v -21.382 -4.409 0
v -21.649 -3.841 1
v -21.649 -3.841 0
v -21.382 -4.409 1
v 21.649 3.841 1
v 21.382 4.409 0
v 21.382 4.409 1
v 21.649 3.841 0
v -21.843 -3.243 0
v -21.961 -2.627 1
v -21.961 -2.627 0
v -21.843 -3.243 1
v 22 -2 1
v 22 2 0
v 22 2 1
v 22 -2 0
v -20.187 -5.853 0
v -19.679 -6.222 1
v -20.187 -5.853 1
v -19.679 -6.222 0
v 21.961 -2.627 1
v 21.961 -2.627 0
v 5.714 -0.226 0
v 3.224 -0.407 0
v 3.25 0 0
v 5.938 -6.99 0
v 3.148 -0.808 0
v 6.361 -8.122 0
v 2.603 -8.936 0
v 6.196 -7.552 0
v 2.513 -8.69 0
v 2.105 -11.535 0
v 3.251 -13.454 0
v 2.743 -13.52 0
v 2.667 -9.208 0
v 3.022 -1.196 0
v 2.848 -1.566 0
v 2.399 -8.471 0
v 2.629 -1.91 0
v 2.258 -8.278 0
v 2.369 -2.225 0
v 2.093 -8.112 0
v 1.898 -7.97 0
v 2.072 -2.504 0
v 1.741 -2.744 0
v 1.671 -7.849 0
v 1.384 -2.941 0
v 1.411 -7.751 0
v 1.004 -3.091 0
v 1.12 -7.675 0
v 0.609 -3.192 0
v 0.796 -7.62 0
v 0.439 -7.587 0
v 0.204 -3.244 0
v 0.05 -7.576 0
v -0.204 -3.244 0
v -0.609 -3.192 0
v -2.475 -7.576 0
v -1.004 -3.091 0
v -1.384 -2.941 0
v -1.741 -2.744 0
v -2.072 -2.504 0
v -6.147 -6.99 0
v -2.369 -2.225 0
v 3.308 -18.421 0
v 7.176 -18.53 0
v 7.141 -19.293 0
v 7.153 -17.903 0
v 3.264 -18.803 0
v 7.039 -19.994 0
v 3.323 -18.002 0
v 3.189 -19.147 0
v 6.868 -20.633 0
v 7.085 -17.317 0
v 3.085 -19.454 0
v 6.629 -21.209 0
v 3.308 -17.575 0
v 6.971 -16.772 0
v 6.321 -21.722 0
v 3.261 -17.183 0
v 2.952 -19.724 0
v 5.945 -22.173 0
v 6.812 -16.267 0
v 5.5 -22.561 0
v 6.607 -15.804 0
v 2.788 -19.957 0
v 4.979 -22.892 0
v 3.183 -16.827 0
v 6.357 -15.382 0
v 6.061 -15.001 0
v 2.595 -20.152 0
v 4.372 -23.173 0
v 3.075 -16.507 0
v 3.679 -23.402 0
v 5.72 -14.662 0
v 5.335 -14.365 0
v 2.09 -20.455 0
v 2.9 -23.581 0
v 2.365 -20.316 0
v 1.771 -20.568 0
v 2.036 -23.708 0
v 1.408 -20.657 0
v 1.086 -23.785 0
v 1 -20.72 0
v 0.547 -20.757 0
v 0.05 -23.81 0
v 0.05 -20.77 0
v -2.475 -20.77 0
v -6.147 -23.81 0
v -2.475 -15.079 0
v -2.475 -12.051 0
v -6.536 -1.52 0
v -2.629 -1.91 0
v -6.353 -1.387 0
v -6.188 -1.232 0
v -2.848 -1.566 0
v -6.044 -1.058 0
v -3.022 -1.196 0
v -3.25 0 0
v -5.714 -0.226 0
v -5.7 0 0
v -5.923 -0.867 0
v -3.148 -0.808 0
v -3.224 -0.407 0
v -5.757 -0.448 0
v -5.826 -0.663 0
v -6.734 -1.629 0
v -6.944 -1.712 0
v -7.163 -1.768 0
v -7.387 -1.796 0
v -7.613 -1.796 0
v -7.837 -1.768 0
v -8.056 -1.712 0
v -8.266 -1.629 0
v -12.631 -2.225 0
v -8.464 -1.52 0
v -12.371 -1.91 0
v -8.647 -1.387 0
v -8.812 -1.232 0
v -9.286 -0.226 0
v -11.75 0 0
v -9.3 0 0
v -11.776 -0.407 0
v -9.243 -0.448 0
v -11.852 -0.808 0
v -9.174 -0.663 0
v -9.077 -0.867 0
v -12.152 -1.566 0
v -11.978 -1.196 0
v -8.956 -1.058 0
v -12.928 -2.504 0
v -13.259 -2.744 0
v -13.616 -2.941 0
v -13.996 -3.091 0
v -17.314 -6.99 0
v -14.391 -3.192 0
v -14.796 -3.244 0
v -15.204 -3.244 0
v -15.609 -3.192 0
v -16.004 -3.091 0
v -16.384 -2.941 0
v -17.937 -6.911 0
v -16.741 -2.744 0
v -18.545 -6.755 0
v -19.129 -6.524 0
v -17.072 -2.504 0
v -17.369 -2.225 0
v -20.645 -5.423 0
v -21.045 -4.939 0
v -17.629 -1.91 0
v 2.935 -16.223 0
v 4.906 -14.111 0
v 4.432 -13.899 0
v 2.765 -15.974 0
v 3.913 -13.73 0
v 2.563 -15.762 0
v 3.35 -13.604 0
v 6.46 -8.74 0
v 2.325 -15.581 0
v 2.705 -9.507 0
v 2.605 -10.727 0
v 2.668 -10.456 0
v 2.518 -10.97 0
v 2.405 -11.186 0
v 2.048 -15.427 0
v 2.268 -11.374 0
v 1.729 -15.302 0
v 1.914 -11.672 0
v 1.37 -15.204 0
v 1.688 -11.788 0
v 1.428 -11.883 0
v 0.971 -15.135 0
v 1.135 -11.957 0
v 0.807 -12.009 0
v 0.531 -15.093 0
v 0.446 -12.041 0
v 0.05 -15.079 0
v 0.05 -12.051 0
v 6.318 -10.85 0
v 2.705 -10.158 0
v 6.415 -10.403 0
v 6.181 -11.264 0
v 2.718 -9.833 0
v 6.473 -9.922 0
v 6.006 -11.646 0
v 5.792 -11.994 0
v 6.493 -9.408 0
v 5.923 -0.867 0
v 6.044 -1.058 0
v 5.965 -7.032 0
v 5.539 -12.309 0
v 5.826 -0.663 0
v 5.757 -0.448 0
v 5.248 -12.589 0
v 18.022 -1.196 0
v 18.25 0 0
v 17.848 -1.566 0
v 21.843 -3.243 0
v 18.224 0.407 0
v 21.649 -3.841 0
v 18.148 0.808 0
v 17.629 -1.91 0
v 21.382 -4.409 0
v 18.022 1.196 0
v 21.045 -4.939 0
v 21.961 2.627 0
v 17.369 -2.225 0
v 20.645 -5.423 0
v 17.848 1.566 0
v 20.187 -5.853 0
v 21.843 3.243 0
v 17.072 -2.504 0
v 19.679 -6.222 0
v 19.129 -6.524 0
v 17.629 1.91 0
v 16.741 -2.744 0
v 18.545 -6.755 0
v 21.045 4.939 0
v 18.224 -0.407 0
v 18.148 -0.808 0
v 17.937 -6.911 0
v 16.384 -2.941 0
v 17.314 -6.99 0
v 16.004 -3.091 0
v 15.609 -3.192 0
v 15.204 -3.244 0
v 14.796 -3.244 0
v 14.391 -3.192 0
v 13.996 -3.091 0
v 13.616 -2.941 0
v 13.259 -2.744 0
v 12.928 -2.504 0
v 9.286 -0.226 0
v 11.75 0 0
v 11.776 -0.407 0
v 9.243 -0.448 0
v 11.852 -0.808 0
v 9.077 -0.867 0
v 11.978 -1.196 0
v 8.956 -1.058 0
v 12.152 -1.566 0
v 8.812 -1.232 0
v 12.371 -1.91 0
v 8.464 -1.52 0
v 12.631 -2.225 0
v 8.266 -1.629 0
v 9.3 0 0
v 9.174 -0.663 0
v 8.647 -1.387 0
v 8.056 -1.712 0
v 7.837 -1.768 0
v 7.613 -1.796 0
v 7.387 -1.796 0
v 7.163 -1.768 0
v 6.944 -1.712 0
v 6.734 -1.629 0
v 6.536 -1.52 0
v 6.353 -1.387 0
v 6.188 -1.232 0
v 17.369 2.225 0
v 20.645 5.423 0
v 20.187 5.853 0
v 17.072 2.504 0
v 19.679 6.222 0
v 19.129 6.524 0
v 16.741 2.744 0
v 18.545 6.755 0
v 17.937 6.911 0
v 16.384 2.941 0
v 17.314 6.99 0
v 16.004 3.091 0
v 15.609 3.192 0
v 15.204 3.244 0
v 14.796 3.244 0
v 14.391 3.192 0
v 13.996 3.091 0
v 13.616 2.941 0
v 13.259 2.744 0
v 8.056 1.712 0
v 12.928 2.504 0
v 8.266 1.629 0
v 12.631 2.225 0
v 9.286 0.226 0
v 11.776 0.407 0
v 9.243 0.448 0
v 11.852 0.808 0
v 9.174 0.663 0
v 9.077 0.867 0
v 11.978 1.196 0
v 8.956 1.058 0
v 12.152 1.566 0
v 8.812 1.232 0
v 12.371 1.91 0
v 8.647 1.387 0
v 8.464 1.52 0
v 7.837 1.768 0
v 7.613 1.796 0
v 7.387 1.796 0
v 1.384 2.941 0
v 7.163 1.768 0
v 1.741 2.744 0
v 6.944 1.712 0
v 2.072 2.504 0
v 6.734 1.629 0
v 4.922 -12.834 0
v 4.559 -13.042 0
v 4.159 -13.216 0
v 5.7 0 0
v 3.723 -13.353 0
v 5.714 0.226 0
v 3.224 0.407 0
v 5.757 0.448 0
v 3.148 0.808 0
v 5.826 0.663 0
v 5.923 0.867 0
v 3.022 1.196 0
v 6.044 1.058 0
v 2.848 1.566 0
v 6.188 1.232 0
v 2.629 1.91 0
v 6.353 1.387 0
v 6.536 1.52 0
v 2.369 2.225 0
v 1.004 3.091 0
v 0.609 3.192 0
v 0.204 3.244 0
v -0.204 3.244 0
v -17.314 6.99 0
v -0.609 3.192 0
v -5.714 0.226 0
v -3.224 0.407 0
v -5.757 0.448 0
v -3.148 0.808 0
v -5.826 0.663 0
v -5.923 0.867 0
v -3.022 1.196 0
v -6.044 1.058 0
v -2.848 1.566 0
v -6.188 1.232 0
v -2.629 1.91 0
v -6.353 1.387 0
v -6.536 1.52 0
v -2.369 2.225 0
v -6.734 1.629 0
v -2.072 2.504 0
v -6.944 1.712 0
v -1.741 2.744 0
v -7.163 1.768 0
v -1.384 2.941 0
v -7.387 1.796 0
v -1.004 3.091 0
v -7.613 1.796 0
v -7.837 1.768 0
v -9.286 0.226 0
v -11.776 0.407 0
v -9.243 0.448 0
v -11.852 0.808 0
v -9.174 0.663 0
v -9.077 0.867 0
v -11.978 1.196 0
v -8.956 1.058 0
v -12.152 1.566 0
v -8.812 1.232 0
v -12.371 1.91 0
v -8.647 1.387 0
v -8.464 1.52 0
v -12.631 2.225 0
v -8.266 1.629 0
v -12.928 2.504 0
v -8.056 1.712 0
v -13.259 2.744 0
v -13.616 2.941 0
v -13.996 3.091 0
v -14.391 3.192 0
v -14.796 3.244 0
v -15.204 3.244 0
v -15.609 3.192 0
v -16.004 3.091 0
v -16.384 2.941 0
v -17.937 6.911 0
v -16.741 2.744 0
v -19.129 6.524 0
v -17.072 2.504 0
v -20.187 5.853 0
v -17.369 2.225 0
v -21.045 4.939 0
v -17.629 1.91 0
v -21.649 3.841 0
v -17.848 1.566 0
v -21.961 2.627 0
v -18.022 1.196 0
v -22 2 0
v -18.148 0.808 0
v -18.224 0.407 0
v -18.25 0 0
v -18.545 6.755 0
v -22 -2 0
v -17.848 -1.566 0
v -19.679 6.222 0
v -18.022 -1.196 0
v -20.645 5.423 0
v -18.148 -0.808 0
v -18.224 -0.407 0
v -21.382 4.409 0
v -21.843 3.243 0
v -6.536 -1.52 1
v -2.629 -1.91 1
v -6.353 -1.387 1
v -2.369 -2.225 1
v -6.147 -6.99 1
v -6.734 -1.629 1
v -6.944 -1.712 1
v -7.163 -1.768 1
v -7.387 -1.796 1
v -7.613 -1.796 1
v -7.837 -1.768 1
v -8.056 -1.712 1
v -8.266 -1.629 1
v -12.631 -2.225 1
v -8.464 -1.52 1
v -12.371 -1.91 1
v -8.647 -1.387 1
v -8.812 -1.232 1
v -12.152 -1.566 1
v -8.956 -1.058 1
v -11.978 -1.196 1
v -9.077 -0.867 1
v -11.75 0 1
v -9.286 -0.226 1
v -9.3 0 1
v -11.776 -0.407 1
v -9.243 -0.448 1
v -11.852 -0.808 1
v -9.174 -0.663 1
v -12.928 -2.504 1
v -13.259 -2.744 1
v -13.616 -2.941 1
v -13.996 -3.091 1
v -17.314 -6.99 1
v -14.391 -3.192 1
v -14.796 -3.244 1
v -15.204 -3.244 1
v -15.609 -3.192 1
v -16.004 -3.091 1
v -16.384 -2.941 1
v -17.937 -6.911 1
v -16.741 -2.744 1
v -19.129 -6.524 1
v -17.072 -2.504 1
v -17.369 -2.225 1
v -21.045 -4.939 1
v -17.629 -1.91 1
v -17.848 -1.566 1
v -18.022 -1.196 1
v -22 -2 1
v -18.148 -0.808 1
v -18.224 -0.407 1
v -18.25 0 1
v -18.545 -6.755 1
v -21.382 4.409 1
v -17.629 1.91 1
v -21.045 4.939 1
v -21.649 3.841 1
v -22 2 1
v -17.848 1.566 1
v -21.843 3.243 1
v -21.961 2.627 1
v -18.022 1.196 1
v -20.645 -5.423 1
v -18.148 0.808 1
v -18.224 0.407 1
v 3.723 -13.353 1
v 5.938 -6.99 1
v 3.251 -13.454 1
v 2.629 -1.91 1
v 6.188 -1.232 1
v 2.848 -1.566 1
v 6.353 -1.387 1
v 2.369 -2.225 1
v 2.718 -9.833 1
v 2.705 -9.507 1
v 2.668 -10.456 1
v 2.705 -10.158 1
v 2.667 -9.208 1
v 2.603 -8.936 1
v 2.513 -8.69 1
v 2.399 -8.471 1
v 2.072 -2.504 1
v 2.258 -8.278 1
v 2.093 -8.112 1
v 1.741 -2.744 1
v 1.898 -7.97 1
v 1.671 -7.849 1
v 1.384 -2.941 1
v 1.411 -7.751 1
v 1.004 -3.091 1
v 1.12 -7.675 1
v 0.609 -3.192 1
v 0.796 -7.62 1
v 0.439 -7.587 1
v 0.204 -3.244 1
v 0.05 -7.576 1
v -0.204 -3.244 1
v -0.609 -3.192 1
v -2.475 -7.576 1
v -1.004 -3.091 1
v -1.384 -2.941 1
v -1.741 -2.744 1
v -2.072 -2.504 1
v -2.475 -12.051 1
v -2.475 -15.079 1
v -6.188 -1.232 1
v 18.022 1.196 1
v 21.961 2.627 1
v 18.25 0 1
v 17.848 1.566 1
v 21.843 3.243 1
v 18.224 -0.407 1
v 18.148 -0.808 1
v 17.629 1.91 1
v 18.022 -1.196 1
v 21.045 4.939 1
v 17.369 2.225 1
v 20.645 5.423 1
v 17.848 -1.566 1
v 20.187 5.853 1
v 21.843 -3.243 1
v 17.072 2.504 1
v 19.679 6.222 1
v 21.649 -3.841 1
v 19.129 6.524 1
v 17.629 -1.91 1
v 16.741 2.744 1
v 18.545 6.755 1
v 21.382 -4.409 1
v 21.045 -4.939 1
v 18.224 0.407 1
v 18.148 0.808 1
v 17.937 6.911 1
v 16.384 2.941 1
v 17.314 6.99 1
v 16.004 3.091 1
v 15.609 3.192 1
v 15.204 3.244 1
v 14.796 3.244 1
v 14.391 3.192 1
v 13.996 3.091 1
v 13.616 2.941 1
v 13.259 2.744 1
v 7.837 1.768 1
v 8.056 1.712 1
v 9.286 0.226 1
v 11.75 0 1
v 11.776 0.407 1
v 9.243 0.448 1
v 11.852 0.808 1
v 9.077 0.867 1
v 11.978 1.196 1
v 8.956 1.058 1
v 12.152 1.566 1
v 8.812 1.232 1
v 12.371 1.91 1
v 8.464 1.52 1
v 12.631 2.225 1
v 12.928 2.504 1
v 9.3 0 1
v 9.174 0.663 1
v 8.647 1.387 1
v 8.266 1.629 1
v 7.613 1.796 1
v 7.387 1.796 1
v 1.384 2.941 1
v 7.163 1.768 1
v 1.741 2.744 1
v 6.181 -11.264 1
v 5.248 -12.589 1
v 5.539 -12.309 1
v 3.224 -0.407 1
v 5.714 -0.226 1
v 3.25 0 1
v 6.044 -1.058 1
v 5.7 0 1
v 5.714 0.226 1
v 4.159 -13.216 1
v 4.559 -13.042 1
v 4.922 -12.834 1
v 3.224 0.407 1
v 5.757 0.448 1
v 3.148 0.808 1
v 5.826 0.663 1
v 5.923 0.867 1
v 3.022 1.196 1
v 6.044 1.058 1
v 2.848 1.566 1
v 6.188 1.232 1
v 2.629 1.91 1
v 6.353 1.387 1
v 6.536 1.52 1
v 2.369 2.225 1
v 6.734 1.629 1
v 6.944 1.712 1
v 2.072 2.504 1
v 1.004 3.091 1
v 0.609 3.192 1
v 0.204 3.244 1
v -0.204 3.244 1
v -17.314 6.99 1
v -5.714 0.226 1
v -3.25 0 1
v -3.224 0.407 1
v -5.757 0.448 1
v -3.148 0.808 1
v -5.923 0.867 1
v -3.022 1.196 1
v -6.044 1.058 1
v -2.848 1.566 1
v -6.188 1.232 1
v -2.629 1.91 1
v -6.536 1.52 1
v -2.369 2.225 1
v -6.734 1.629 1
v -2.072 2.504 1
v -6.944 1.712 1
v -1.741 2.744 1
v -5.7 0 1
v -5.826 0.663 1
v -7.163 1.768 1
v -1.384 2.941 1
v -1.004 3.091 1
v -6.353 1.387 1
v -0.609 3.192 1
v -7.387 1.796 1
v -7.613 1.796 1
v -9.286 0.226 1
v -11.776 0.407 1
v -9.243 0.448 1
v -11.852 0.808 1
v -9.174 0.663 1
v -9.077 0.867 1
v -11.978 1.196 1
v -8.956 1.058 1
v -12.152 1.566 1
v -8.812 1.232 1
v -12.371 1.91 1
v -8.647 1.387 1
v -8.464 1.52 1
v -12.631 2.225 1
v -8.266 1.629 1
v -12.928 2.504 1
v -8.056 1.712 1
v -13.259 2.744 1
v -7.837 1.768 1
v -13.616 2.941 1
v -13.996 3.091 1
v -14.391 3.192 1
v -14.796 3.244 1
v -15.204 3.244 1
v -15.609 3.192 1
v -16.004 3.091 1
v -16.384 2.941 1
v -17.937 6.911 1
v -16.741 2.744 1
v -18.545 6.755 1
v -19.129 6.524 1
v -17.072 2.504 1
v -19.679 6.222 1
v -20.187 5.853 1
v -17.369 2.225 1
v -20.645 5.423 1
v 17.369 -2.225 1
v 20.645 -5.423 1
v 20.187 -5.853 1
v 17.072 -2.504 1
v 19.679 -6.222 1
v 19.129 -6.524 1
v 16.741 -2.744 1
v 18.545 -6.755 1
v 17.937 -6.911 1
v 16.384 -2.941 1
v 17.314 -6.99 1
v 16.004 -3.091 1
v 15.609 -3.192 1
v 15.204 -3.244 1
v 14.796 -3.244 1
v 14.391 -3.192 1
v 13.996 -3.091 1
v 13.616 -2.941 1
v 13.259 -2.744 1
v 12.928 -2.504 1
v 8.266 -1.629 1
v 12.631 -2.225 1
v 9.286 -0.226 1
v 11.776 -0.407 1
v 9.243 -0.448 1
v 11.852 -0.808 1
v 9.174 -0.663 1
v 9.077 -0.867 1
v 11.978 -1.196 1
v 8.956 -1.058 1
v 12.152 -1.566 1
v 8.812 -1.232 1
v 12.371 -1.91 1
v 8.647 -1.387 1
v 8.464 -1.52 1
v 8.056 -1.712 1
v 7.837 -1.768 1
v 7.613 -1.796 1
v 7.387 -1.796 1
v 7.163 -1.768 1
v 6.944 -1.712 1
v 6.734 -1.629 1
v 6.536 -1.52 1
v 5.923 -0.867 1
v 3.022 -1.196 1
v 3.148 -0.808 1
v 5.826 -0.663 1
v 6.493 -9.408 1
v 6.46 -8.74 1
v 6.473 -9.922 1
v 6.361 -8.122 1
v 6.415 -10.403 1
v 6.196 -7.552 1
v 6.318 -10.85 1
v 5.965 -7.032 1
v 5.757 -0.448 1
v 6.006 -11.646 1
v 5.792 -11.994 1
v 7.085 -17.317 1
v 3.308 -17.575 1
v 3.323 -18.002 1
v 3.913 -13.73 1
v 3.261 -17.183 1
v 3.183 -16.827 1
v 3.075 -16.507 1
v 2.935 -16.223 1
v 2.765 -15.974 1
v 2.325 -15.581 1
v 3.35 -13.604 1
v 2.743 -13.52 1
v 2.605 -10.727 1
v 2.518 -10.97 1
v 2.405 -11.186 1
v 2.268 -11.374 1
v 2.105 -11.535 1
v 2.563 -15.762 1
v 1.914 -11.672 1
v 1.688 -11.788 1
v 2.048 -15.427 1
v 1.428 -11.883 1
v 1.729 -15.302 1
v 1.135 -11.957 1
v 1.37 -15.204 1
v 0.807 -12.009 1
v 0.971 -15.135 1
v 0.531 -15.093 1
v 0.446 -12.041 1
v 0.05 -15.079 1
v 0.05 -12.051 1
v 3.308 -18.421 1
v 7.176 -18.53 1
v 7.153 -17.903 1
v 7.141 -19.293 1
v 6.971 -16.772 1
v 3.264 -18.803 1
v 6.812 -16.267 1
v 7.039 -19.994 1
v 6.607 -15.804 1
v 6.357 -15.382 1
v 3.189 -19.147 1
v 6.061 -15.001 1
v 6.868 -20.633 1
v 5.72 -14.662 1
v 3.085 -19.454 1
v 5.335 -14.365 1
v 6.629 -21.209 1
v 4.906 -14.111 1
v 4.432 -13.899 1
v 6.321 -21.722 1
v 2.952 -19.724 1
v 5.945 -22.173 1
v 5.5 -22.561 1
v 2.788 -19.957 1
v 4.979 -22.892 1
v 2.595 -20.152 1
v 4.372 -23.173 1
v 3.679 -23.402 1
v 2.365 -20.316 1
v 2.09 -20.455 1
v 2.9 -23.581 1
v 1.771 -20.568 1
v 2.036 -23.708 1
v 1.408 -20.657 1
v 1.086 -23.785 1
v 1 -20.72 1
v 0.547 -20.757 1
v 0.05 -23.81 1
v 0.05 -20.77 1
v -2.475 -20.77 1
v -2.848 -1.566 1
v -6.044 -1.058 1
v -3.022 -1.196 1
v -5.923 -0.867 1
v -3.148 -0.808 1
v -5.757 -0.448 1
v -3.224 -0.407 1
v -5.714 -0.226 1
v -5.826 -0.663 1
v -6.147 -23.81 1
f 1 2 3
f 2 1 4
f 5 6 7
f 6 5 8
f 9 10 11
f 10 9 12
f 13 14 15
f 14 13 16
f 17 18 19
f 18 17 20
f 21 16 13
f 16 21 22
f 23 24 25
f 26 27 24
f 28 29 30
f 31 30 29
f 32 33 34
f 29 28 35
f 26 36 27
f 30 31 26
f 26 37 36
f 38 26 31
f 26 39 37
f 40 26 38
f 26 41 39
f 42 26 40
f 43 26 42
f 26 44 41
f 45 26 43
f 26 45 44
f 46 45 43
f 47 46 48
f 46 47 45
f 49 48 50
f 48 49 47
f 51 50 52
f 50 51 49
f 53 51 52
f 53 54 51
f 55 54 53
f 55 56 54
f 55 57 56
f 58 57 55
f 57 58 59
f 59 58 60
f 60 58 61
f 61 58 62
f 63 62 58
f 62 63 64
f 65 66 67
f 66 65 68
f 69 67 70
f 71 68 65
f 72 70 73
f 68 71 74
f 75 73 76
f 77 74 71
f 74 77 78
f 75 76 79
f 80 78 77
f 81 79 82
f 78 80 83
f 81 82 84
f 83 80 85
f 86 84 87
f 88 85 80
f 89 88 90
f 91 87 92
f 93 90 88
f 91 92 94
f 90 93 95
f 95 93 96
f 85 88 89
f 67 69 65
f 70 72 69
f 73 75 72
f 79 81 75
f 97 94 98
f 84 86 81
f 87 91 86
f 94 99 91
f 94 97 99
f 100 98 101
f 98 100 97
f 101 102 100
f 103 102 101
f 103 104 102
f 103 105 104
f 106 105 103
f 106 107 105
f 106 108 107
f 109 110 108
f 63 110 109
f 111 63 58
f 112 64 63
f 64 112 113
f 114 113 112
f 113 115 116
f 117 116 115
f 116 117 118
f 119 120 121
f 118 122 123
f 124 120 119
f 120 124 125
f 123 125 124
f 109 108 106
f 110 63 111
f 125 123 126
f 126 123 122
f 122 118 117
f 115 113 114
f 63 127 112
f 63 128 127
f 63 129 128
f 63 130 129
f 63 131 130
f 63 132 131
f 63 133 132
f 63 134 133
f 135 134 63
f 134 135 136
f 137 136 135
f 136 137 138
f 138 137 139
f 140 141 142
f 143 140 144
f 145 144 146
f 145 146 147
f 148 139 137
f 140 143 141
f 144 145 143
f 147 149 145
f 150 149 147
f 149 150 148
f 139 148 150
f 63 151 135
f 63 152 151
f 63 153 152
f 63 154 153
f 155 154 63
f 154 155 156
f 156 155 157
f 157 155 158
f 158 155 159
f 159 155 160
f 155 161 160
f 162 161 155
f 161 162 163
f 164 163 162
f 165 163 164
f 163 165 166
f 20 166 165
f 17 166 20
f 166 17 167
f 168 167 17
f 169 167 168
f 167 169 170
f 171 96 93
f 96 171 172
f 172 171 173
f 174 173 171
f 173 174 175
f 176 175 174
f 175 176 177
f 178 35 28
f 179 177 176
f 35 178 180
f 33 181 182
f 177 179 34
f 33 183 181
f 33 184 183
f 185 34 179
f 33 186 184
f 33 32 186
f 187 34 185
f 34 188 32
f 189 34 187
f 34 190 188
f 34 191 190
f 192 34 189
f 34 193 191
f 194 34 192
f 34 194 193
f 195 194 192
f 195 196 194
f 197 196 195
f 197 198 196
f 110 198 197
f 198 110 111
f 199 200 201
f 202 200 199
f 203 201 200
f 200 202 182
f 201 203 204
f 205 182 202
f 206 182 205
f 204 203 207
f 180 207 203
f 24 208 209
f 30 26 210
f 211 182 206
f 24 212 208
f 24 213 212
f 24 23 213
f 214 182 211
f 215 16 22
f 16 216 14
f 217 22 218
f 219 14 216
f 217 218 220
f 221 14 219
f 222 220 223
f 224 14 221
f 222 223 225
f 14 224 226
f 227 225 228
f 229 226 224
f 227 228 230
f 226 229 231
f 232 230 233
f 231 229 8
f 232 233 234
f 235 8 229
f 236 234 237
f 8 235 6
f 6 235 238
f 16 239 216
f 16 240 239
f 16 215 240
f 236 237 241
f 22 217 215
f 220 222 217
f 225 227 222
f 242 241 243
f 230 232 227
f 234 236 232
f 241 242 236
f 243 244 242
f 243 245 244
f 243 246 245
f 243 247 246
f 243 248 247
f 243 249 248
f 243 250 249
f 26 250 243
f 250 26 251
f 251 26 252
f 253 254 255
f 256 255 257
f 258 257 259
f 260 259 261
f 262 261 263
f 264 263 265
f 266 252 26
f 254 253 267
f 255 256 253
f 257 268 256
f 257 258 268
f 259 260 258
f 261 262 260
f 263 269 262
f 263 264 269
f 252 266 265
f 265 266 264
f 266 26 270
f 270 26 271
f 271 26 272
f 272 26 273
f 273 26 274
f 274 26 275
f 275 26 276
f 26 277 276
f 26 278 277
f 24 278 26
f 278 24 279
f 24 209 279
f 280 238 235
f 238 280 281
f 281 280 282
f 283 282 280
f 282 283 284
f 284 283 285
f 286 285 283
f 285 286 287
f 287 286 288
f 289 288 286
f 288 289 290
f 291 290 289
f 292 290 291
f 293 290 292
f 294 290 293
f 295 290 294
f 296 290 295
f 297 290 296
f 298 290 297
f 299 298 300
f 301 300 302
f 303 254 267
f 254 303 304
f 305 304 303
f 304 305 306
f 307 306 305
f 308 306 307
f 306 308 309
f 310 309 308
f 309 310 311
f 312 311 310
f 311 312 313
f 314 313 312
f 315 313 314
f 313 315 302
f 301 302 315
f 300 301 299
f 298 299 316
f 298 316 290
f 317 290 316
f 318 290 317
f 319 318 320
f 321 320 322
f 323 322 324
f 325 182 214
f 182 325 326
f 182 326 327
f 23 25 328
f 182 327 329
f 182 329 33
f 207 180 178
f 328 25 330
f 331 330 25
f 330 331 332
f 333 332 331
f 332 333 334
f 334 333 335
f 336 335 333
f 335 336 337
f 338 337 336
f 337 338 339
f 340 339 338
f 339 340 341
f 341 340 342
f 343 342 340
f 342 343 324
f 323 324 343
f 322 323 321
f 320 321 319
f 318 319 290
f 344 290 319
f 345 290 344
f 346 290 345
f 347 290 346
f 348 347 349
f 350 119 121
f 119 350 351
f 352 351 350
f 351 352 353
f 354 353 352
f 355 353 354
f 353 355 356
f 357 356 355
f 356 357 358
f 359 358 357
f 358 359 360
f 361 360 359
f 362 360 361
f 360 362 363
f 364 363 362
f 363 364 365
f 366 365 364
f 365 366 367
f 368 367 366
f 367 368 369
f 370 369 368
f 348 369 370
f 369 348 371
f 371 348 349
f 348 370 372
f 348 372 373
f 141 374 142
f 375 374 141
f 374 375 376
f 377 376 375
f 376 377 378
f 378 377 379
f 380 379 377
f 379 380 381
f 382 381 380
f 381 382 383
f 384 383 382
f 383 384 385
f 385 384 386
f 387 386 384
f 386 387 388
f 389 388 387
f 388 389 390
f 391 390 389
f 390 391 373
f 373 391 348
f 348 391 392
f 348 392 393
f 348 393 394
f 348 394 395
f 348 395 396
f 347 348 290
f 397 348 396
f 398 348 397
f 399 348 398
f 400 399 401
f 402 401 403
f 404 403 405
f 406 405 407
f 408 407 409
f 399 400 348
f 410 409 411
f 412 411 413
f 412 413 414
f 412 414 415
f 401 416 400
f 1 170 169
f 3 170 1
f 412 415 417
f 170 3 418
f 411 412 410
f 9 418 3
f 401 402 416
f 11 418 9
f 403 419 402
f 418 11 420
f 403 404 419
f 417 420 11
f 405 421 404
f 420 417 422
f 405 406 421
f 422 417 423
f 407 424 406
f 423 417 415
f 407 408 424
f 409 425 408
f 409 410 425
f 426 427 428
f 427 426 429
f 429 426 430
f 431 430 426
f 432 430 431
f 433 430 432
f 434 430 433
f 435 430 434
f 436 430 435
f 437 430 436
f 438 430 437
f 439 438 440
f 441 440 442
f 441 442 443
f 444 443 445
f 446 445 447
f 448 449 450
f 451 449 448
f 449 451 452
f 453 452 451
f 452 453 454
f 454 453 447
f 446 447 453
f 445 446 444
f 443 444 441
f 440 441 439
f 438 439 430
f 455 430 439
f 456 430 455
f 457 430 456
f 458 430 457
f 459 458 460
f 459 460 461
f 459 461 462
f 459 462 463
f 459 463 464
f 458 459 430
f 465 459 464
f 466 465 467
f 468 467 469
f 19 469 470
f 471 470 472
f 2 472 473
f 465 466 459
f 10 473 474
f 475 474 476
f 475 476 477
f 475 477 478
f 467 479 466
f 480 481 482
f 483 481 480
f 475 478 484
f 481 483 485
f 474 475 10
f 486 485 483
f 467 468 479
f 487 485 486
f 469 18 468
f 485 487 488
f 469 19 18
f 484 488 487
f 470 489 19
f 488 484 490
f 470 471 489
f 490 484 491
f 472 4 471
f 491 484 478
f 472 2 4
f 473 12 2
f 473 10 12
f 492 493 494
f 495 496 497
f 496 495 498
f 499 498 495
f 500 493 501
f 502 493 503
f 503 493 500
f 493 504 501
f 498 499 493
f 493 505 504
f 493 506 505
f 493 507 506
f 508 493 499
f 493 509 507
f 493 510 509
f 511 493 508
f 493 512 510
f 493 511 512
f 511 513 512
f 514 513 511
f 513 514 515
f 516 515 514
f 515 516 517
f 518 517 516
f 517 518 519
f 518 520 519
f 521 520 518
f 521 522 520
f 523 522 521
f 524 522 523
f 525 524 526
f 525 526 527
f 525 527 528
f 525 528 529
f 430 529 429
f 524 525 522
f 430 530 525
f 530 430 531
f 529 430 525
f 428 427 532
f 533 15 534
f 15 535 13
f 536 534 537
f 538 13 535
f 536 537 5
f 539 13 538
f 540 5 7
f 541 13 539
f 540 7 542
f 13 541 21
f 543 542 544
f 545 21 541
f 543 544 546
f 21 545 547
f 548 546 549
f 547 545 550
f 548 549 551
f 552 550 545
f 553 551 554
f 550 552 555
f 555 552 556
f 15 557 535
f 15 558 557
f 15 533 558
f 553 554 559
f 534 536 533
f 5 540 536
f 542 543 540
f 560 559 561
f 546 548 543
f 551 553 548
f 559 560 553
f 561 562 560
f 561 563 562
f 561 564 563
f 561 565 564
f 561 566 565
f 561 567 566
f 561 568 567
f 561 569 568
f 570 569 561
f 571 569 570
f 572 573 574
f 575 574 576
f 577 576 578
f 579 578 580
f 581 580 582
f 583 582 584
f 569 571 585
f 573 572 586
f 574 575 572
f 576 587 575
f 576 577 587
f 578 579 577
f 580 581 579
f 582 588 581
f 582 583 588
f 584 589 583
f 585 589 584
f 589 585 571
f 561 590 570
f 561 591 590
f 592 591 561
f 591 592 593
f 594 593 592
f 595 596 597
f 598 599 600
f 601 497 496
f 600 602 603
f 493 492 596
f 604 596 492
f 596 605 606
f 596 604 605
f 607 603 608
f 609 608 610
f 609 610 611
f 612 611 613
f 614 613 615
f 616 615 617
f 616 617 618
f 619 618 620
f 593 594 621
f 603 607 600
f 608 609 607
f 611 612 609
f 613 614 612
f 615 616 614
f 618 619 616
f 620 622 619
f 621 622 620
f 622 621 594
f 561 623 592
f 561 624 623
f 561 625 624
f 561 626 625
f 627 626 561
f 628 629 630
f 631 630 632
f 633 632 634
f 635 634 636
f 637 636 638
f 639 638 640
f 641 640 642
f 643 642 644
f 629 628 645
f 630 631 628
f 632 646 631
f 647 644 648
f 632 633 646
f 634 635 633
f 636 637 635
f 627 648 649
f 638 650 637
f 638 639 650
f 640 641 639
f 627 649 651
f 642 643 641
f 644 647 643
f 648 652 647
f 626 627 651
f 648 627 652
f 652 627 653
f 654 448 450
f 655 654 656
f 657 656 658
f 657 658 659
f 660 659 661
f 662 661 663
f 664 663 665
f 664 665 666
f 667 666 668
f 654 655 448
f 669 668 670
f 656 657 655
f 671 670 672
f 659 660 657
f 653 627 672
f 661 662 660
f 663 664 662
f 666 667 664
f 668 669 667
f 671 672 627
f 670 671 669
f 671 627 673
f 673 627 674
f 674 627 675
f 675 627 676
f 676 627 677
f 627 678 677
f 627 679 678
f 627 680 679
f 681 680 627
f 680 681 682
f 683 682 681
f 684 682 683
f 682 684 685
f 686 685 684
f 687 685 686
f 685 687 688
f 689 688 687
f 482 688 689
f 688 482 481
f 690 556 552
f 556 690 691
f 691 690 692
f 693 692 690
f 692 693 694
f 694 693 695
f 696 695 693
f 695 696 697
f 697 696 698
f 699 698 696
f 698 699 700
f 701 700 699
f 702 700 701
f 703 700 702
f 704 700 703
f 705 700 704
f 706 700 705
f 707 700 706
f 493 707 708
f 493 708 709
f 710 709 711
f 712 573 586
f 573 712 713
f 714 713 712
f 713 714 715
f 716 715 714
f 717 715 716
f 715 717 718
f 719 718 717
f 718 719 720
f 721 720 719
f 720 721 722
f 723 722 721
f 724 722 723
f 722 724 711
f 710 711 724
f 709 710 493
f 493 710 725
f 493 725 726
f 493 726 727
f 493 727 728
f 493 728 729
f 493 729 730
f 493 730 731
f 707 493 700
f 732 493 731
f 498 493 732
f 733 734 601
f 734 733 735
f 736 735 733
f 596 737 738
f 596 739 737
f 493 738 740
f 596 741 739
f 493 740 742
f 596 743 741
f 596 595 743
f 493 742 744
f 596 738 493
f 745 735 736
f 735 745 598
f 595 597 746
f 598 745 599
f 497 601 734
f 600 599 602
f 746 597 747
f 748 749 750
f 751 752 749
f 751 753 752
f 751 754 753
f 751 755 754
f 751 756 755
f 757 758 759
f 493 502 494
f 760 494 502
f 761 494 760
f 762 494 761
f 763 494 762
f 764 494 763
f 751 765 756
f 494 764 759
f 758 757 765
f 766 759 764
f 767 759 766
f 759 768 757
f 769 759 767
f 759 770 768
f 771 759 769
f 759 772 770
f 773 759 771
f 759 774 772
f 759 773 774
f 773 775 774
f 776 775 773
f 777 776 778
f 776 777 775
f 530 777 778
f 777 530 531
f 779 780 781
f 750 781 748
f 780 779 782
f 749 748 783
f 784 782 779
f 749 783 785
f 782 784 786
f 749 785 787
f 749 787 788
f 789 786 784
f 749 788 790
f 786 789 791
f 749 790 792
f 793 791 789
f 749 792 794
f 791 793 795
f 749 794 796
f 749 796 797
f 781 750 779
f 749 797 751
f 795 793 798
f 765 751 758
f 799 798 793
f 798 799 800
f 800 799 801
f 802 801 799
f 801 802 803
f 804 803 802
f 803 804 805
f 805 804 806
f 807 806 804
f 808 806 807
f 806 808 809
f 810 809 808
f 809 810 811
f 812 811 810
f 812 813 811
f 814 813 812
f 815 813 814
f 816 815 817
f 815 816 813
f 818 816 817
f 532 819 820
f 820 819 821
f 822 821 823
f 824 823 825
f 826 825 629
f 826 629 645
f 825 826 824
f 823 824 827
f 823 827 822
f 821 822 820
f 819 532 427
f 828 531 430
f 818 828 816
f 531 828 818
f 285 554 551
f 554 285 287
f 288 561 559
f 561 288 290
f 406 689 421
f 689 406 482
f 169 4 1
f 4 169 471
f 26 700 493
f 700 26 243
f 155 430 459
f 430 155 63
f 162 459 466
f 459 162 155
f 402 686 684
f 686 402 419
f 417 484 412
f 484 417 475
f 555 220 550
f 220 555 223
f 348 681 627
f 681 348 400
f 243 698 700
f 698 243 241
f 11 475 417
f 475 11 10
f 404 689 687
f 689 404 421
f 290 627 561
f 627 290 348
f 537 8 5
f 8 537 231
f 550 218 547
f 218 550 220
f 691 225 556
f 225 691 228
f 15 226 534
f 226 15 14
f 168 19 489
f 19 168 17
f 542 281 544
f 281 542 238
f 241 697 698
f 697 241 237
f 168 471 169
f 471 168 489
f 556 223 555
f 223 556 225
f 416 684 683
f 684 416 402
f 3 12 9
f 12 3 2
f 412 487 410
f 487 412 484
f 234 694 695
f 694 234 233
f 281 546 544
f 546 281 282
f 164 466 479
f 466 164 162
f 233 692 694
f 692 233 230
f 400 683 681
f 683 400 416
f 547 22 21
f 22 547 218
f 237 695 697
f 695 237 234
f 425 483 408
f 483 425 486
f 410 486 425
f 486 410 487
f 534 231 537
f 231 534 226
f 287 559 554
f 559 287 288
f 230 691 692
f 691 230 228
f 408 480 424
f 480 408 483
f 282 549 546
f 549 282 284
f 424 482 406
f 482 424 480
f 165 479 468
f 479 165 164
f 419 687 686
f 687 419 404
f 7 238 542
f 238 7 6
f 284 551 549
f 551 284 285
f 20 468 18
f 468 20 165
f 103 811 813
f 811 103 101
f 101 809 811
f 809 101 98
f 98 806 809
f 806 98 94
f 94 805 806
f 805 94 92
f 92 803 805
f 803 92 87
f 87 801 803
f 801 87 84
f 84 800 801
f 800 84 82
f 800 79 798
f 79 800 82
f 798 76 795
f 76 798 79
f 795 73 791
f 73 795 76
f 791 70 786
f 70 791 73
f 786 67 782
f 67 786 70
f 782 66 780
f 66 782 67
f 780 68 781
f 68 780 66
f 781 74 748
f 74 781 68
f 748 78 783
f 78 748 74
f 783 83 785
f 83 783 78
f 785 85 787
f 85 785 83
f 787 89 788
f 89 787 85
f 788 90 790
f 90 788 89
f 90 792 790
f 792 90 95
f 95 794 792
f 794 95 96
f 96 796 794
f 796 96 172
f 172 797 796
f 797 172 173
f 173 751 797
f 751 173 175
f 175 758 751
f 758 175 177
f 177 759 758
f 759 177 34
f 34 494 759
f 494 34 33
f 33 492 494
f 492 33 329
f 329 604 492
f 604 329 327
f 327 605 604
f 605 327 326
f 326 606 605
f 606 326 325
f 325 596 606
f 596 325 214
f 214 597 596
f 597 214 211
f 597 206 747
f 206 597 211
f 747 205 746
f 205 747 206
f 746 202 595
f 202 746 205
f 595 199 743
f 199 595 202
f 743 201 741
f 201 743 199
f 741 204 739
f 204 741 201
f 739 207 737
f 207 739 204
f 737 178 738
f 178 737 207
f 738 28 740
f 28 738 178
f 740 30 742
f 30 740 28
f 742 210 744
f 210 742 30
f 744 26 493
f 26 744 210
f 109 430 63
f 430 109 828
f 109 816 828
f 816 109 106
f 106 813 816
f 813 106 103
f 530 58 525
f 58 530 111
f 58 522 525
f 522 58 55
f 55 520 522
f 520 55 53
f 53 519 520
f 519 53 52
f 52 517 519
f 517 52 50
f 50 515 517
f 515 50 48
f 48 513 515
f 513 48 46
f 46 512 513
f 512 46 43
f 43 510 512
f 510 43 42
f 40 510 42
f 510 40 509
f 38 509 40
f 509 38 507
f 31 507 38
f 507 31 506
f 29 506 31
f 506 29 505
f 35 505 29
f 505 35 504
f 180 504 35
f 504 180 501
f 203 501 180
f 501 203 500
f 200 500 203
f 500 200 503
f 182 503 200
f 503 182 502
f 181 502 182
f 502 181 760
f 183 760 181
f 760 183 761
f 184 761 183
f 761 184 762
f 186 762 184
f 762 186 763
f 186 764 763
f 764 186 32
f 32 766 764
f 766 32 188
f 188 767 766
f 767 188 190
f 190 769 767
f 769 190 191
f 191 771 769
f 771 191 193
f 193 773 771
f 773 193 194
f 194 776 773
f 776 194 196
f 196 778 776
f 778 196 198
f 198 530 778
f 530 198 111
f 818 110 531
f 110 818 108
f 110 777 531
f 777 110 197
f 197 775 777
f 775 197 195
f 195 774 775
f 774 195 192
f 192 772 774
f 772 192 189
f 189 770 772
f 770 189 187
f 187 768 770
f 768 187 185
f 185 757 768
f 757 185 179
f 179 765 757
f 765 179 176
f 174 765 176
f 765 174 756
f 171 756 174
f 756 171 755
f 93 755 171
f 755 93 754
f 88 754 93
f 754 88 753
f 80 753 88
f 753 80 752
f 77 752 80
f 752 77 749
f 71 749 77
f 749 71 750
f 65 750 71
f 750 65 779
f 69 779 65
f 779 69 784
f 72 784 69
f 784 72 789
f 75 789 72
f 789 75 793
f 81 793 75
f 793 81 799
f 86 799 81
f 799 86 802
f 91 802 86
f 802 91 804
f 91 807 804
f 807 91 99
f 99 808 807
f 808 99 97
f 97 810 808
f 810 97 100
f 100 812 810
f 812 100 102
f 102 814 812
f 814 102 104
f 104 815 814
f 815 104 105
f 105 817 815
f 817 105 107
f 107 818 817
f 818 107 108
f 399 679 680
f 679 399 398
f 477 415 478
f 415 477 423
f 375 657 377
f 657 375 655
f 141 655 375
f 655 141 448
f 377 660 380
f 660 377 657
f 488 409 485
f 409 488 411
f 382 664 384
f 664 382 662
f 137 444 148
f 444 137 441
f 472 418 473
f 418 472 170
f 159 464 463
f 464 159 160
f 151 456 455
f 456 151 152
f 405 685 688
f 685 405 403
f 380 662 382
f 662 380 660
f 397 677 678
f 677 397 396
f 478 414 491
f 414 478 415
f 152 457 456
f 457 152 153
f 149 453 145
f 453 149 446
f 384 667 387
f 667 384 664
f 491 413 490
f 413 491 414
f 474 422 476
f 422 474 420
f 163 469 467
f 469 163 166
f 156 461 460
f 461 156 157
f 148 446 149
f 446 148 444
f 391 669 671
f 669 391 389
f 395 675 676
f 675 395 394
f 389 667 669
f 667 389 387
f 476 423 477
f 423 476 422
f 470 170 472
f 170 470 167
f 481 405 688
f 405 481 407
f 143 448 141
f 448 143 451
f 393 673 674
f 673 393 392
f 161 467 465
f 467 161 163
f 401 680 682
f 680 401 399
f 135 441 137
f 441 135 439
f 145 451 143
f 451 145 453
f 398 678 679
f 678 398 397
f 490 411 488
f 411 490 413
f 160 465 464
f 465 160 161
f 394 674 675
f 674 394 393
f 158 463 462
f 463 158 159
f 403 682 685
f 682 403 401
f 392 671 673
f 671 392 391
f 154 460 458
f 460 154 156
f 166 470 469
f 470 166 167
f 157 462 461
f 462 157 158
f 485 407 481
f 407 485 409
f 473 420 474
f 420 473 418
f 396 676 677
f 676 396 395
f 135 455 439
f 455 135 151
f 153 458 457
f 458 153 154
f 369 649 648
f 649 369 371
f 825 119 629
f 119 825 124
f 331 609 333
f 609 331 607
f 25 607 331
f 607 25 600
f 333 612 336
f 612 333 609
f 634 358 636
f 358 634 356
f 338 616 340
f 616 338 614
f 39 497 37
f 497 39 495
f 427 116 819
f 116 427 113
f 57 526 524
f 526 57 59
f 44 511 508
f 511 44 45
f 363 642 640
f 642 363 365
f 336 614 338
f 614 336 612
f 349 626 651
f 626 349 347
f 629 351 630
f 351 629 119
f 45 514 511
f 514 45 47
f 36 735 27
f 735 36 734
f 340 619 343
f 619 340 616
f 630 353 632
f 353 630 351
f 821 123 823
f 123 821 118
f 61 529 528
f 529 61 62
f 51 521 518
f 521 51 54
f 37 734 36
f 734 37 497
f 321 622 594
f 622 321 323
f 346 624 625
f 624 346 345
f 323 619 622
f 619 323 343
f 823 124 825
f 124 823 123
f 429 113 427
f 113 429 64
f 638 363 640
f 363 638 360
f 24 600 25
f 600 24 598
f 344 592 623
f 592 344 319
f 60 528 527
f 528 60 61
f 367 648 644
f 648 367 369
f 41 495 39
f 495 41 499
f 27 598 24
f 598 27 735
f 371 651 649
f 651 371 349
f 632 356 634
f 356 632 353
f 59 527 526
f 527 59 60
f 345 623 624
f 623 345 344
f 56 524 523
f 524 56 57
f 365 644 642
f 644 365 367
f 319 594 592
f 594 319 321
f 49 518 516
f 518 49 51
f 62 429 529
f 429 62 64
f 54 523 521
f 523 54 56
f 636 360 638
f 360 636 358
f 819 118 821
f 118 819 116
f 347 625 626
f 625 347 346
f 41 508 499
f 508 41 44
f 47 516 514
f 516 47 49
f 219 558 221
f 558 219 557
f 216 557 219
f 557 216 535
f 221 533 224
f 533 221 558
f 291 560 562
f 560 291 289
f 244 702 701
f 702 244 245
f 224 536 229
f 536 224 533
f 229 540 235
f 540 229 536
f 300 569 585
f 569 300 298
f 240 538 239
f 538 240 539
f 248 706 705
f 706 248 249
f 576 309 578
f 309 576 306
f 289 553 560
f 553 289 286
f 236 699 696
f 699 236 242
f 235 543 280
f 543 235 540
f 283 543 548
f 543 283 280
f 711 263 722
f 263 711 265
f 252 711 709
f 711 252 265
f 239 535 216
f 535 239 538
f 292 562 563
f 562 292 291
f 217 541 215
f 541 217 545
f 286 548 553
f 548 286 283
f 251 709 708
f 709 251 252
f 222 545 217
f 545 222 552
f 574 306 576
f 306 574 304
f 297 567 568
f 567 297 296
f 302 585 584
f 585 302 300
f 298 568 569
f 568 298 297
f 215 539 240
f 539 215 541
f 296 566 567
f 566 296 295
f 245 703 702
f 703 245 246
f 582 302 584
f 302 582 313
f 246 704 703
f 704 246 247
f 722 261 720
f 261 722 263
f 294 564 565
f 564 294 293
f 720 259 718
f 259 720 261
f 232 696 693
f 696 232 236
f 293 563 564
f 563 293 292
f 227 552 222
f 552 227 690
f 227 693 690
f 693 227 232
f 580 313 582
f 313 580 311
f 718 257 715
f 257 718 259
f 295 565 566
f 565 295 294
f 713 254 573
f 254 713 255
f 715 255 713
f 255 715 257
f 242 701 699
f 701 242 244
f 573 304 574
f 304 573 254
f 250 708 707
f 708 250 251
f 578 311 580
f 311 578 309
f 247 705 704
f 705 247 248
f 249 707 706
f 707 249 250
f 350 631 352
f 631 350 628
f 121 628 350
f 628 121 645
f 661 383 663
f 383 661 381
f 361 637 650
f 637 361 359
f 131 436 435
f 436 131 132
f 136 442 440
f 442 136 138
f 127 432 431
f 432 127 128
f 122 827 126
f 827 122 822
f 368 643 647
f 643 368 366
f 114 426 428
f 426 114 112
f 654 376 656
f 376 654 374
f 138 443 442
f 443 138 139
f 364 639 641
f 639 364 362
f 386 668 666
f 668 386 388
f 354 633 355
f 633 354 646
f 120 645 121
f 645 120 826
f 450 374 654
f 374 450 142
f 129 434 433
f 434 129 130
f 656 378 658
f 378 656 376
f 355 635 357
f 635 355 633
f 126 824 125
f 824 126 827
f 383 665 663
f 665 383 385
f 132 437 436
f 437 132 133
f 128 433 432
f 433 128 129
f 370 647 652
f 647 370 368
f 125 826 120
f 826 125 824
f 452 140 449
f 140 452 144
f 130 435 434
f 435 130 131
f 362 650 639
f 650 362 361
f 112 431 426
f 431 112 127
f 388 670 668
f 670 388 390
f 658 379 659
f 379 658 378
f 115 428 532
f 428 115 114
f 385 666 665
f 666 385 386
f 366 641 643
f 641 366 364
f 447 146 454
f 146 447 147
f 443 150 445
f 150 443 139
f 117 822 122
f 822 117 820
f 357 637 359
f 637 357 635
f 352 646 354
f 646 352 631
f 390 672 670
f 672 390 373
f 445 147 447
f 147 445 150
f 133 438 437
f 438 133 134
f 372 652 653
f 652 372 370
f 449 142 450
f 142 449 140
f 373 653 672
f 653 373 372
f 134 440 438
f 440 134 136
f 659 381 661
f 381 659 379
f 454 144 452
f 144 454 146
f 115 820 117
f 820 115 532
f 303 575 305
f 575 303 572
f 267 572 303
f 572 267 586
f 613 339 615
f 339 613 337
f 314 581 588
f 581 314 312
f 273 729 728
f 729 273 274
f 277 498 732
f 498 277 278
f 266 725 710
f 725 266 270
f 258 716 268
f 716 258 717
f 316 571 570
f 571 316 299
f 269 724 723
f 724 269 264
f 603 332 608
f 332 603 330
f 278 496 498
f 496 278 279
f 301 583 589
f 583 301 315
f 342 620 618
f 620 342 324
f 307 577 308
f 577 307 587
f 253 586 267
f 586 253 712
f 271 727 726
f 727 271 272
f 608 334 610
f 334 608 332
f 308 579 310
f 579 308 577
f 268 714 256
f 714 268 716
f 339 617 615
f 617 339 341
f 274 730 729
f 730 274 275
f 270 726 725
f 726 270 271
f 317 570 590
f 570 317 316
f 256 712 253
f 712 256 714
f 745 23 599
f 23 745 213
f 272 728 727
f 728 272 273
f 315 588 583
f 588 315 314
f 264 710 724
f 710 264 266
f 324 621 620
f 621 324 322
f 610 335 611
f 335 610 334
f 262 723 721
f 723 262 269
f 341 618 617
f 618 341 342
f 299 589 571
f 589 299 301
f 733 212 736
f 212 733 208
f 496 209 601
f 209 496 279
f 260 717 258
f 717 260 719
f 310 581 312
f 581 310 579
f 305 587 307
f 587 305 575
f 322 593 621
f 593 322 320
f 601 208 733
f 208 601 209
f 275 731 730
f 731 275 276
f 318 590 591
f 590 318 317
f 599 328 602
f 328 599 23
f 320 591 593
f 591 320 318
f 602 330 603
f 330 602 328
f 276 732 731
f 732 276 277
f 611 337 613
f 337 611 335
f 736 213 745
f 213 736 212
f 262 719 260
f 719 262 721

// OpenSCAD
$fn = 50;


difference() {
	union() {
		*color(alpha = 1.0000000000, c = "gray") {
			translate(v = [0, 14, 0]) {
				linear_extrude(height = 1) {
					text(font = "Arial:style=Bold", halign = "center", size = 4.5000000000, text = "COMMENT description oobb_plate_shape_p_type_1_depth_3_width_1_thickness_b_extra_oobb_size", valign = "center");
				}
			}
		}
		hull() {
			translate(v = [-17.0000000000, 2.0000000000, 0]) {
				cylinder(h = 1, r = 5);
			}
			translate(v = [17.0000000000, 2.0000000000, 0]) {
				cylinder(h = 1, r = 5);
			}
			translate(v = [-17.0000000000, -2.0000000000, 0]) {
				cylinder(h = 1, r = 5);
			}
			translate(v = [17.0000000000, -2.0000000000, 0]) {
				cylinder(h = 1, r = 5);
			}
		}
		translate(v = [0, -5, 0]) {
			linear_extrude(height = 1) {
				text(font = "DejaVu Sans Mono:style=Bold", halign = "center", size = 19.0000000000, text = "B", valign = "top");
			}
		}
	}
	union() {
		*color(alpha = 1.0000000000, c = "gray") {
			translate(v = [0, 14, 0]) {
				linear_extrude(height = 1) {
					text(font = "Arial:style=Bold", halign = "center", size = 4.5000000000, text = "COMMENT description oobb_holes_shape_n_type_3_width_1_thickness_b_extra_oobb_size_1_height_'all'_holes_true_both_holes", valign = "center");
				}
			}
		}
		translate(v = [-15.0000000000, 0.0000000000, 0]) {
			translate(v = [0, 0, -50]) {
				cylinder(h = 100, r = 3.2500000000);
			}
		}
		translate(v = [0, 0, -50]) {
			cylinder(h = 100, r = 3.2500000000);
		}
		translate(v = [15.0000000000, 0.0000000000, 0]) {
			translate(v = [0, 0, -50]) {
				cylinder(h = 100, r = 3.2500000000);
			}
		}
		translate(v = [-15.0000000000, 0.0000000000, 0]) {
			translate(v = [0, 0, -50]) {
				cylinder(h = 100, r = 1.8000000000);
			}
		}
		translate(v = [-7.5000000000, 0.0000000000, 0]) {
			translate(v = [0, 0, -50]) {
				cylinder(h = 100, r = 1.8000000000);
			}
		}
		translate(v = [0, 0, -50]) {
			cylinder(h = 100, r = 1.8000000000);
		}
		translate(v = [7.5000000000, 0.0000000000, 0]) {
			translate(v = [0, 0, -50]) {
				cylinder(h = 100, r = 1.8000000000);
			}
		}
		translate(v = [15.0000000000, 0.0000000000, 0]) {
			translate(v = [0, 0, -50]) {
				cylinder(h = 100, r = 1.8000000000);
			}
		}
	}
}
